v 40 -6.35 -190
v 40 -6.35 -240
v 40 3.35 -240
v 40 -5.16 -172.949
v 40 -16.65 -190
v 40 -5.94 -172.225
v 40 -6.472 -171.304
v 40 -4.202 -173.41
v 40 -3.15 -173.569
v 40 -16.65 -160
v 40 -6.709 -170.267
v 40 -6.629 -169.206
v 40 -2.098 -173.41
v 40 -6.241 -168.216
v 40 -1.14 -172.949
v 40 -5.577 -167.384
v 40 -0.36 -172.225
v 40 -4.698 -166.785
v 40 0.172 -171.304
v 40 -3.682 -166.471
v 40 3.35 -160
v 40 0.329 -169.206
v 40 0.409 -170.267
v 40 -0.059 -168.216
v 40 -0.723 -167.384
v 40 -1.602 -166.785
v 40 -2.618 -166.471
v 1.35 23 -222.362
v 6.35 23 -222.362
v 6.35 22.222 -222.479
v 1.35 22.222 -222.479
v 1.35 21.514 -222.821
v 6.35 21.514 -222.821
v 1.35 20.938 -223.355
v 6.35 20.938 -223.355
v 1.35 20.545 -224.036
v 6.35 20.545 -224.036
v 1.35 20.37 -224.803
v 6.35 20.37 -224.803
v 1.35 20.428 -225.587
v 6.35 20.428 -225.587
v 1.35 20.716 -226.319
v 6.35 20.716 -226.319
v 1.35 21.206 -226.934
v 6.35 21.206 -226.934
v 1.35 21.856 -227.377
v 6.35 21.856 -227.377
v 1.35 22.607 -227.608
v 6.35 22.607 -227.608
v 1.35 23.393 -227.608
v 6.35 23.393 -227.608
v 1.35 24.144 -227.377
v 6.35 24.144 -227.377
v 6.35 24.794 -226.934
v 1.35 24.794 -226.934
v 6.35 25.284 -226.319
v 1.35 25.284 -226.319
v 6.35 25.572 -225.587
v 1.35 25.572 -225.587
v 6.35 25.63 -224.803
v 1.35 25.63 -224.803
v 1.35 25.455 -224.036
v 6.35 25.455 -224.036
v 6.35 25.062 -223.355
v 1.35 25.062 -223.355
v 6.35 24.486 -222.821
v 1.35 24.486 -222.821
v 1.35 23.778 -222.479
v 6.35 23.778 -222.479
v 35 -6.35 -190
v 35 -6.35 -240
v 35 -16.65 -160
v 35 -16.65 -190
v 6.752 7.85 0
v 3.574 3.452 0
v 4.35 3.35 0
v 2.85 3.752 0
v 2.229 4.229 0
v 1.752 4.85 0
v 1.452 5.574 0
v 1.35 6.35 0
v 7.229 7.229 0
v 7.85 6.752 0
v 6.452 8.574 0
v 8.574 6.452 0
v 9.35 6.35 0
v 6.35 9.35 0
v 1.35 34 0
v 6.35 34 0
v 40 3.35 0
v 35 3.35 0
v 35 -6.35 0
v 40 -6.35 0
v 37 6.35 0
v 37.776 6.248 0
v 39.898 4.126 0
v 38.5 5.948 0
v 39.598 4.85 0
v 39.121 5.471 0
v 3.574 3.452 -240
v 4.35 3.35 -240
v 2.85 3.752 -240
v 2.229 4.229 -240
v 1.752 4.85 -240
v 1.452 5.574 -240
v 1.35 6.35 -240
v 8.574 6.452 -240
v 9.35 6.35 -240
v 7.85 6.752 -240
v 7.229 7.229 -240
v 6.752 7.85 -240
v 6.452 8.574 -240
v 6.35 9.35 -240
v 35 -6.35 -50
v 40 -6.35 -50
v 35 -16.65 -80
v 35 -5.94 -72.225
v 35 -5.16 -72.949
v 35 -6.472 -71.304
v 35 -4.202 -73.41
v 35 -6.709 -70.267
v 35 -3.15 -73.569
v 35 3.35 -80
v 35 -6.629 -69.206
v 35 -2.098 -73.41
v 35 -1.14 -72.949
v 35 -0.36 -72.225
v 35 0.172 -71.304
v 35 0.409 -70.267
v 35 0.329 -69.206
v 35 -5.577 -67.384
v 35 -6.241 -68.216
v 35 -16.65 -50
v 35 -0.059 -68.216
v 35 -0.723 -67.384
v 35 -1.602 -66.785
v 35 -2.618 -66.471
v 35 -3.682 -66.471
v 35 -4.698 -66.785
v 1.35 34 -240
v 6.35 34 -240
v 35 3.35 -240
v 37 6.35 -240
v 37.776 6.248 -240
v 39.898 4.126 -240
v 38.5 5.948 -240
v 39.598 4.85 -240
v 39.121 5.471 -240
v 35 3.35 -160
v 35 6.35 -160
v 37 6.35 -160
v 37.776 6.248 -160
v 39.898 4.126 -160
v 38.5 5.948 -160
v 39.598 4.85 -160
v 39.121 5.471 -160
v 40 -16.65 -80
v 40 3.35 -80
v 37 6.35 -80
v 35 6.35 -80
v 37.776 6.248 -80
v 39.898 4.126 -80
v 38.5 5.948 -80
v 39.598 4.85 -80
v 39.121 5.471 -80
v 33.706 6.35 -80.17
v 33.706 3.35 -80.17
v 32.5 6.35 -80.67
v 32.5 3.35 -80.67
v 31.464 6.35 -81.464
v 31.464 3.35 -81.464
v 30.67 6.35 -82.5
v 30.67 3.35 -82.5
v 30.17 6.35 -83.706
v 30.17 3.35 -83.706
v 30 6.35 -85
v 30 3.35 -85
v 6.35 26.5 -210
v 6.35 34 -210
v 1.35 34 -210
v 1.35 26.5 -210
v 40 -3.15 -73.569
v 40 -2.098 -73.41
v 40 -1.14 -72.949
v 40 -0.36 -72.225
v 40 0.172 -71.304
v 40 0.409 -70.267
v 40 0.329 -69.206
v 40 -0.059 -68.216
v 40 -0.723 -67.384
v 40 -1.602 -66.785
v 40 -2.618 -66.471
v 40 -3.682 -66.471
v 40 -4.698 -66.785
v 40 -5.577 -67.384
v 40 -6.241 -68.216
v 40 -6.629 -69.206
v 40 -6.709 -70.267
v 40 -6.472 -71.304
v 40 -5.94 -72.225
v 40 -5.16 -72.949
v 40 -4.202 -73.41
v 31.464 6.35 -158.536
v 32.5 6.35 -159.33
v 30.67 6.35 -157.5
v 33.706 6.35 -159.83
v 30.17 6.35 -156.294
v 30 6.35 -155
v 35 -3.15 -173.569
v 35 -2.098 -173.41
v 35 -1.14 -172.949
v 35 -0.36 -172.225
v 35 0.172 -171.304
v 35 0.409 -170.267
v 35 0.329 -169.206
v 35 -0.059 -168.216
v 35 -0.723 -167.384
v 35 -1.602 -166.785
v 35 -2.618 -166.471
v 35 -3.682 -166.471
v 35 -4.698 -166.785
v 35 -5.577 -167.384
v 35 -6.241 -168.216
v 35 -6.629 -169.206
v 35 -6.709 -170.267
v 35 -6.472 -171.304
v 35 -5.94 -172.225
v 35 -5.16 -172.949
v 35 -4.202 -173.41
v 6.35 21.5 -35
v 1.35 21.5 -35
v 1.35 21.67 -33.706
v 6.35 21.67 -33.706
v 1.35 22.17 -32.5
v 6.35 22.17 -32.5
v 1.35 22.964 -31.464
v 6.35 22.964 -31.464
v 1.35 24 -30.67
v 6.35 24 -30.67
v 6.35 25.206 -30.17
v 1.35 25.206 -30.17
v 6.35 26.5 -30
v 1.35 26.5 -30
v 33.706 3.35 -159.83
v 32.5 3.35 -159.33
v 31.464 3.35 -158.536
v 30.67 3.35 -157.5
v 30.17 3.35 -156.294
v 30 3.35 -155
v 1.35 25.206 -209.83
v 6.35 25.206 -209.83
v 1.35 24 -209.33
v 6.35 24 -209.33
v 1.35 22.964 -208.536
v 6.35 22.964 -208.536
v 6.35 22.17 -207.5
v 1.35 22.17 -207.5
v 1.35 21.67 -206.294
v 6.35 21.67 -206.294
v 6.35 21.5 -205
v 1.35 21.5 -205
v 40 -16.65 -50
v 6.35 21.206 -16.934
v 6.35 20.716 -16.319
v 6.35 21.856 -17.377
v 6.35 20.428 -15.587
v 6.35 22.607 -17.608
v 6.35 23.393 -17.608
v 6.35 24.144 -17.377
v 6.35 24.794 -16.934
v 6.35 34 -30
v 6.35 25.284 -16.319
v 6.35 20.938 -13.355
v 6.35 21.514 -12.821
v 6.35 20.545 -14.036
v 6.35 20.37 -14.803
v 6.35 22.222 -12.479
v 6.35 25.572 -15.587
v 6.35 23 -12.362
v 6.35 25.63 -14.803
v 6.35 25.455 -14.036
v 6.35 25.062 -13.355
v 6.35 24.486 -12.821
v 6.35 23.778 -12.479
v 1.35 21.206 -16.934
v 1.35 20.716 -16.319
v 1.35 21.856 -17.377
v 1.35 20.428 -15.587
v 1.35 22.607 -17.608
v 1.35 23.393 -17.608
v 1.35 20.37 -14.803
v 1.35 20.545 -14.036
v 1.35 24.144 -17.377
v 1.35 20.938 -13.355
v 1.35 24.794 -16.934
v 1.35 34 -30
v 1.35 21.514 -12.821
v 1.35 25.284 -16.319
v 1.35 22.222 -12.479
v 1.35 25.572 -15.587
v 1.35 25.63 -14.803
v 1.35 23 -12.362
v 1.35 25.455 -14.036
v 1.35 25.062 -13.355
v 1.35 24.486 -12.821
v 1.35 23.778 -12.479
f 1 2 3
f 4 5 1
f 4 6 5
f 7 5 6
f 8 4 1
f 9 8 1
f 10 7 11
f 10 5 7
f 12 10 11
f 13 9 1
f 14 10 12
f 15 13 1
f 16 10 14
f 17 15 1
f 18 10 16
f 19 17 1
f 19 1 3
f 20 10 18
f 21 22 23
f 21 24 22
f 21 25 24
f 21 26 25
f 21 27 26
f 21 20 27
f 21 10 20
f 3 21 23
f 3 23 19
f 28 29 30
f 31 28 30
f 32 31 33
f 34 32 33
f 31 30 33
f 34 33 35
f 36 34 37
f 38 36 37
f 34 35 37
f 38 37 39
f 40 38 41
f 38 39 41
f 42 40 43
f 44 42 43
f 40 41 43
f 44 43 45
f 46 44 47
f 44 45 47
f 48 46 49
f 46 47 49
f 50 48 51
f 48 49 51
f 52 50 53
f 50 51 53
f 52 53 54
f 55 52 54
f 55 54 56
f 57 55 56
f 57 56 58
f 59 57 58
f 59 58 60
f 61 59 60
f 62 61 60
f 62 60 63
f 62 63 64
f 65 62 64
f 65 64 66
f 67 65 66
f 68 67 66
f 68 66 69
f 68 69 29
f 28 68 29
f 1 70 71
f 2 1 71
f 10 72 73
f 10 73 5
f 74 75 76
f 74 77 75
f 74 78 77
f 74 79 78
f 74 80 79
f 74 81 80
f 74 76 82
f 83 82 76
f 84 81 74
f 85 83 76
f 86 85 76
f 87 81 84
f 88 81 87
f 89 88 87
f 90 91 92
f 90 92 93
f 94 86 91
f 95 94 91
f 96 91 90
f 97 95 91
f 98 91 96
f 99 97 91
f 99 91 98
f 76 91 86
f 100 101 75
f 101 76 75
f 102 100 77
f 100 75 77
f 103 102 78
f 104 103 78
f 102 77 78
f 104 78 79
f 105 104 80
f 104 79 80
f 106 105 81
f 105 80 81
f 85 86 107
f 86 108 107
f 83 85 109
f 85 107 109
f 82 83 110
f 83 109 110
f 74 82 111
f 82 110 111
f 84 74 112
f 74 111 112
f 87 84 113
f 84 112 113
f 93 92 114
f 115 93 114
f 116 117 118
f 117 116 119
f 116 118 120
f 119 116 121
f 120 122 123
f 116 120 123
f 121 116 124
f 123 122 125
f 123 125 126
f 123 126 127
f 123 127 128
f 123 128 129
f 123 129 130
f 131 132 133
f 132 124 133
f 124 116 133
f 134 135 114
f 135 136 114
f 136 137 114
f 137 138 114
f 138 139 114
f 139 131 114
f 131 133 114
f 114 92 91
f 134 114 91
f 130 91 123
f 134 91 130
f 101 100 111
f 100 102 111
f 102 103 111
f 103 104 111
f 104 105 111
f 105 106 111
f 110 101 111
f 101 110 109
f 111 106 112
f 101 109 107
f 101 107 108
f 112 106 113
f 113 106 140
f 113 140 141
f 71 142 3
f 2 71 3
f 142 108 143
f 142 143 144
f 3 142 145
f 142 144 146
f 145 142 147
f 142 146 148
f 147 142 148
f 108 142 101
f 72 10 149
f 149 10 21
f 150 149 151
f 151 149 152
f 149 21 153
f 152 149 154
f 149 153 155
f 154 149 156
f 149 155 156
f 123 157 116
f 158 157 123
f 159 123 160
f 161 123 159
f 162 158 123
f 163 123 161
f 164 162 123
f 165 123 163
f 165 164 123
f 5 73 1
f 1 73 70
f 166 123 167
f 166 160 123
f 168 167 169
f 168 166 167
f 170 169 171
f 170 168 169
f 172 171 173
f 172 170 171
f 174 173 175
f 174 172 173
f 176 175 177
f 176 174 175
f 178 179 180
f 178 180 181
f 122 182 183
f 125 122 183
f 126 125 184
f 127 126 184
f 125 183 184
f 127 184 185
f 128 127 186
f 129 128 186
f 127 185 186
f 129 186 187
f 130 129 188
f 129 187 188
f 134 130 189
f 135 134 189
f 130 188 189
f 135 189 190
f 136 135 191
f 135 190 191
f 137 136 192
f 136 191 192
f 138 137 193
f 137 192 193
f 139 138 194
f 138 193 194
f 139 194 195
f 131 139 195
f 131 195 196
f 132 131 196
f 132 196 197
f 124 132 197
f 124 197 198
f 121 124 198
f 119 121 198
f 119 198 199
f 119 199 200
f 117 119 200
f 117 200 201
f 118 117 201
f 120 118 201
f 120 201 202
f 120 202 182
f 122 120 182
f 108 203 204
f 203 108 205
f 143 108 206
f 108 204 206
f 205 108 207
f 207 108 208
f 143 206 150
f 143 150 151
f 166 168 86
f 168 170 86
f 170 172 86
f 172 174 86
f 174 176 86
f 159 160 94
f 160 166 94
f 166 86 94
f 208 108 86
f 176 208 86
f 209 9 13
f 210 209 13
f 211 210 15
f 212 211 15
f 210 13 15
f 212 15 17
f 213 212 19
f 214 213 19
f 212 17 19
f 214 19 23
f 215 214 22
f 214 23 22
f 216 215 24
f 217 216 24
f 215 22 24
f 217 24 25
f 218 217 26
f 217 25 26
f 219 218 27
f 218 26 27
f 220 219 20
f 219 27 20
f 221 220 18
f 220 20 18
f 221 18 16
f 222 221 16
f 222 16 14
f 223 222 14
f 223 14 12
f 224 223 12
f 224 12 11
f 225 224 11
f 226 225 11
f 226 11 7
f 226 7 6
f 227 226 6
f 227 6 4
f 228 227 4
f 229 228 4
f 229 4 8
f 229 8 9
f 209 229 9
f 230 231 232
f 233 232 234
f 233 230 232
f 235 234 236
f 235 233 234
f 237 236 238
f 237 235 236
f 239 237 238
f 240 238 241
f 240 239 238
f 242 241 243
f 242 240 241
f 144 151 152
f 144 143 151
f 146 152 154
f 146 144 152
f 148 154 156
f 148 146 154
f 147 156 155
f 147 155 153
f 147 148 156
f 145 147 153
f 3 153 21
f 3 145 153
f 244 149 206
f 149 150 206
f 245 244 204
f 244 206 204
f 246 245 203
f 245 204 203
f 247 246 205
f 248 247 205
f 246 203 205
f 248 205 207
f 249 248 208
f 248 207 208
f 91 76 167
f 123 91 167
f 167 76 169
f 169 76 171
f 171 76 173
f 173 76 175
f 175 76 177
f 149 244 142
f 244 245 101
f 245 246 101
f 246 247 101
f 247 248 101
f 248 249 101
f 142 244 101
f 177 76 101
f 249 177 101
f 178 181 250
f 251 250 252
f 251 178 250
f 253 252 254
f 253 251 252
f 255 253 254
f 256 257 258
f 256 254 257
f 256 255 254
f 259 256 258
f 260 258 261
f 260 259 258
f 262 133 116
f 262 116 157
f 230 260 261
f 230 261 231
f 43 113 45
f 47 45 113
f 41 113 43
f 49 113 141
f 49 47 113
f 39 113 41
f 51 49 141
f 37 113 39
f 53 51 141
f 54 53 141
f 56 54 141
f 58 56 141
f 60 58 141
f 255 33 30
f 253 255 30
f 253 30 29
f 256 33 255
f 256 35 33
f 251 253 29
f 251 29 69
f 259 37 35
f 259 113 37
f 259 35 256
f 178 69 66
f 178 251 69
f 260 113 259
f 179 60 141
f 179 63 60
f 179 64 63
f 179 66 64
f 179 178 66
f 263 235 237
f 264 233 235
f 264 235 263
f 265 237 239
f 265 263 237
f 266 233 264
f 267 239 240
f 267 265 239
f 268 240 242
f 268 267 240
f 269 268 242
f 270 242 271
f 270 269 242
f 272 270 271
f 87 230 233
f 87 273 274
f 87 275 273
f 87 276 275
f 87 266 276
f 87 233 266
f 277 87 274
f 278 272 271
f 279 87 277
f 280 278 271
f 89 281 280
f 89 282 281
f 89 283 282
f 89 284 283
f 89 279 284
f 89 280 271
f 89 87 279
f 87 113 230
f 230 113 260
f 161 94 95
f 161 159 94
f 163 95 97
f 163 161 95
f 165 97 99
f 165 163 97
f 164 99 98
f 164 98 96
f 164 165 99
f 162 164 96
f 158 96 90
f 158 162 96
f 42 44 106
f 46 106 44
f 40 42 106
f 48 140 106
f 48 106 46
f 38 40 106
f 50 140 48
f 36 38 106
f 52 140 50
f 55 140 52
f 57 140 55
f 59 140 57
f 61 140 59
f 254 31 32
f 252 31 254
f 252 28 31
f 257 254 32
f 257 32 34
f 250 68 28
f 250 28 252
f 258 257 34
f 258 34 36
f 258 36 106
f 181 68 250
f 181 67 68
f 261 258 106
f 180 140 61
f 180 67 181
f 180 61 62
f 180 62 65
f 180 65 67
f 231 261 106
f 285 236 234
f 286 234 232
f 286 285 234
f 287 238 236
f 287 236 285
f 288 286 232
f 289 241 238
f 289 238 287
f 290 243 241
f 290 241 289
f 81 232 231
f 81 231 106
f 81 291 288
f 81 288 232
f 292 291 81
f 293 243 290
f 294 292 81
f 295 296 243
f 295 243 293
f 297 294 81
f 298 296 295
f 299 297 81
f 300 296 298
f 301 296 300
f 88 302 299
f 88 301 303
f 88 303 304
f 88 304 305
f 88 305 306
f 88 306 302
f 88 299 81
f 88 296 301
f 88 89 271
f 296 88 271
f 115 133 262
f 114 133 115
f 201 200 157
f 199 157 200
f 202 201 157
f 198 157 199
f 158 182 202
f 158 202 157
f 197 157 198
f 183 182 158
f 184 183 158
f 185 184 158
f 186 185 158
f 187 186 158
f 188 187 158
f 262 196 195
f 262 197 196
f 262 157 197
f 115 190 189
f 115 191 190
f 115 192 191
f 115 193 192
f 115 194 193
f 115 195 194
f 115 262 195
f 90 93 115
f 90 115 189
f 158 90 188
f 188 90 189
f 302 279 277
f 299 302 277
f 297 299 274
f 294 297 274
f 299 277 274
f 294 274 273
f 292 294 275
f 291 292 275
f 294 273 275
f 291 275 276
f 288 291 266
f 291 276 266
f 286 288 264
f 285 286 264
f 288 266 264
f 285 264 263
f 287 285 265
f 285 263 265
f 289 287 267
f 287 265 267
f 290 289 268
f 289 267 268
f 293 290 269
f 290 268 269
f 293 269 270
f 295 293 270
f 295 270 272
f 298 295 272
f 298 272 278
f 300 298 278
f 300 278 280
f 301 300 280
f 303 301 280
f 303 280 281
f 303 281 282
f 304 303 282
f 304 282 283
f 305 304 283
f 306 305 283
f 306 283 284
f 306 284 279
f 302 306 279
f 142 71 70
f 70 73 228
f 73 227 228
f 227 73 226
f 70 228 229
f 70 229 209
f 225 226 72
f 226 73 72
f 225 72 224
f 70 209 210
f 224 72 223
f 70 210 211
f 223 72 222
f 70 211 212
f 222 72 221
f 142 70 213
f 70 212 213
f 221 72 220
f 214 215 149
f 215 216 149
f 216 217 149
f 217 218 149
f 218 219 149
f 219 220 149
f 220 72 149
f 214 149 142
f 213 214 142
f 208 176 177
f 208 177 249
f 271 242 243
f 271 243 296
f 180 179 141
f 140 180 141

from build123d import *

# Parameters (mm, degrees)
EXTRUDE_THIN1_DEPTH                       = 240
FILLET1_R                                 = 3
SKETCH3_W                                 = 35
SKETCH3_H                                 = 300
EXTRUDE2_DEPTH                            = 7.35
SKETCH7_W                                 = 300
SKETCH7_H                                 = 40
EXTRUDE4_DEPTH                            = 7.35
EXTRUDE5_DEPTH                            = 7.35
TAPPED_HOLE_FOR_8_32_HELICOIL_D           = 4.3942
TAPPED_HOLE_FOR_8_32_HELICOIL_CBORE_D     = 5.27558
TAPPED_HOLE_FOR_8_32_HELICOIL_CBORE_DEPTH = 5.08
SKETCH20_W                                = 240
SKETCH20_H                                = 34
EXTRUDE12_DEPTH                           = 1.35
SKETCH21_W                                = 30.65
SKETCH21_H                                = 240
EXTRUDE13_DEPTH                           = 3.35
SKETCH22_W                                = 240
SKETCH22_H                                = 3
EXTRUDE14_DEPTH                           = 3
SKETCH23_W                                = 5
SKETCH23_H                                = 23
EXTRUDE15_DEPTH                           = 240
SKETCH24_R                                = 3.5687
EXTRUDE16_DEPTH                           = 39.65
SKETCH25_W                                = 80
SKETCH25_H                                = 60.65
EXTRUDE17_DEPTH                           = 10
FILLET4_R                                 = 5
SKETCH31_W                                = 50
SKETCH31_H                                = 10.3
EXTRUDE23_DEPTH                           = 41
FILLET5_R                                 = 3


with BuildPart() as part:
    # Sketch1 → Extrude-Thin1 (new body)
    with BuildSketch(Plane.XY):
        Polygon((0, 50.8), (0, 0), (50.8, 0), (50.8, 6.35), (6.35, 6.35), (6.35, 50.8), align=None)
    extrude(amount=-EXTRUDE_THIN1_DEPTH)

    # Fillet1
    fillet1_edges = [part.edges().sort_by_distance(p)[0] for p in [
        (6.35, 6.35, -120),
        (50.8, 6.35, -120),
        (6.35, 50.8, -120),
    ]]
    fillet(fillet1_edges, radius=FILLET1_R)

    # Sketch3 → Extrude2 (cut, through all)
    with BuildSketch(Plane(origin=(0, 6.35, 0), x_dir=(1, 0, 0), z_dir=(0, 1, 0))):
        with Locations((49.5, 95)):
            Rectangle(SKETCH3_W, SKETCH3_H)
    extrude(amount=-EXTRUDE2_DEPTH, mode=Mode.SUBTRACT)

    # Sketch7 → Extrude4 (cut, through all)
    with BuildSketch(Plane(origin=(6.35, 0, 0), x_dir=(0, 0, -1), z_dir=(1, 0, 0))):
        with Locations((145, 54)):
            Rectangle(SKETCH7_W, SKETCH7_H)
    extrude(amount=-EXTRUDE4_DEPTH, mode=Mode.SUBTRACT)

    # Sketch10 → Extrude5 (cut, through all)
    with BuildSketch(Plane(origin=(6.35, 0, 0), x_dir=(0, 0, -1), z_dir=(1, 0, 0))):
        with BuildLine():
            Line((30, 51.5), (210, 51.5))
            Line((210, 51.5), (210, 26.5))
            ThreePointArc((210, 26.5), (208.535533906, 22.964466094), (205, 21.5))
            Line((205, 21.5), (35, 21.5))
            ThreePointArc((35, 21.5), (31.464466094, 22.964466094), (30, 26.5))
            Line((30, 26.5), (30, 51.5))
        make_face()
    extrude(amount=-EXTRUDE5_DEPTH, mode=Mode.SUBTRACT)

    # Tapped Hole for #8-32 Helicoil (through all)
    with Locations(Plane(origin=(6.35, 23, -15), x_dir=(0, 0, 1), z_dir=(1, 0, 0))):
        with Locations((0, 0), (-210, 0)):
            CounterBoreHole(TAPPED_HOLE_FOR_8_32_HELICOIL_D / 2, TAPPED_HOLE_FOR_8_32_HELICOIL_CBORE_D / 2, TAPPED_HOLE_FOR_8_32_HELICOIL_CBORE_DEPTH)

    # Sketch20 → Extrude12 (cut)
    with BuildSketch(Plane.ZY):
        with Locations((-120, 17)):
            Rectangle(SKETCH20_W, SKETCH20_H)
    extrude(amount=-EXTRUDE12_DEPTH, mode=Mode.SUBTRACT)

    # Sketch21 → Extrude13 (cut)
    with BuildSketch(Plane.XZ):
        with Locations((16.675, -120)):
            Rectangle(SKETCH21_W, SKETCH21_H)
    extrude(amount=-EXTRUDE13_DEPTH, mode=Mode.SUBTRACT)

    # Sketch22 → Extrude14 (add)
    with BuildSketch(Plane(origin=(32, 0, 0), x_dir=(0, 0, -1), z_dir=(1, 0, 0))):
        with Locations((120, 4.85)):
            Rectangle(SKETCH22_W, SKETCH22_H)
    extrude(amount=EXTRUDE14_DEPTH)

    # Sketch23 → Extrude15 (add)
    with BuildSketch(Plane.XY):
        with Locations((37.5, -5.15)):
            Rectangle(SKETCH23_W, SKETCH23_H)
    extrude(amount=-EXTRUDE15_DEPTH)

    # Sketch24 → Extrude16 (cut, through all)
    with BuildSketch(Plane(origin=(40, 0, 0), x_dir=(0, 0, -1), z_dir=(1, 0, 0))):
        with Locations((170, -3.15)):
            Circle(SKETCH24_R)
        with Locations((70, -3.15)):
            Circle(SKETCH24_R)
    extrude(amount=-EXTRUDE16_DEPTH, mode=Mode.SUBTRACT)

    # Sketch25 → Extrude17 (cut)
    with BuildSketch(Plane(origin=(40, 0, 0), x_dir=(0, 0, -1), z_dir=(1, 0, 0))):
        with Locations((120, 3.675)):
            Rectangle(SKETCH25_W, SKETCH25_H)
    extrude(amount=-EXTRUDE17_DEPTH, mode=Mode.SUBTRACT)

    # Fillet4
    fillet4_edges = [part.edges().sort_by_distance(p)[0] for p in [
        (30, 4.85, -160),
        (30, 4.85, -80),
    ]]
    fillet(fillet4_edges, radius=FILLET4_R)

    # Sketch31 → Extrude23 (cut, through all)
    with BuildSketch(Plane(origin=(0, 0, 0), x_dir=(0, 0, -1), z_dir=(1, 0, 0))):
        with Locations((25, -11.5)):
            Rectangle(SKETCH31_W, SKETCH31_H)
        with Locations((215, -11.5)):
            Rectangle(SKETCH31_W, SKETCH31_H)
    extrude(amount=EXTRUDE23_DEPTH, mode=Mode.SUBTRACT)

    # Fillet5
    fillet5_edges = [part.edges().sort_by_distance(p)[0] for p in [
        (40, 6.35, -200),
        (40, 6.35, -40),
        (1.35, 3.35, -120),
    ]]
    fillet(fillet5_edges, radius=FILLET5_R)


solid = part.part
